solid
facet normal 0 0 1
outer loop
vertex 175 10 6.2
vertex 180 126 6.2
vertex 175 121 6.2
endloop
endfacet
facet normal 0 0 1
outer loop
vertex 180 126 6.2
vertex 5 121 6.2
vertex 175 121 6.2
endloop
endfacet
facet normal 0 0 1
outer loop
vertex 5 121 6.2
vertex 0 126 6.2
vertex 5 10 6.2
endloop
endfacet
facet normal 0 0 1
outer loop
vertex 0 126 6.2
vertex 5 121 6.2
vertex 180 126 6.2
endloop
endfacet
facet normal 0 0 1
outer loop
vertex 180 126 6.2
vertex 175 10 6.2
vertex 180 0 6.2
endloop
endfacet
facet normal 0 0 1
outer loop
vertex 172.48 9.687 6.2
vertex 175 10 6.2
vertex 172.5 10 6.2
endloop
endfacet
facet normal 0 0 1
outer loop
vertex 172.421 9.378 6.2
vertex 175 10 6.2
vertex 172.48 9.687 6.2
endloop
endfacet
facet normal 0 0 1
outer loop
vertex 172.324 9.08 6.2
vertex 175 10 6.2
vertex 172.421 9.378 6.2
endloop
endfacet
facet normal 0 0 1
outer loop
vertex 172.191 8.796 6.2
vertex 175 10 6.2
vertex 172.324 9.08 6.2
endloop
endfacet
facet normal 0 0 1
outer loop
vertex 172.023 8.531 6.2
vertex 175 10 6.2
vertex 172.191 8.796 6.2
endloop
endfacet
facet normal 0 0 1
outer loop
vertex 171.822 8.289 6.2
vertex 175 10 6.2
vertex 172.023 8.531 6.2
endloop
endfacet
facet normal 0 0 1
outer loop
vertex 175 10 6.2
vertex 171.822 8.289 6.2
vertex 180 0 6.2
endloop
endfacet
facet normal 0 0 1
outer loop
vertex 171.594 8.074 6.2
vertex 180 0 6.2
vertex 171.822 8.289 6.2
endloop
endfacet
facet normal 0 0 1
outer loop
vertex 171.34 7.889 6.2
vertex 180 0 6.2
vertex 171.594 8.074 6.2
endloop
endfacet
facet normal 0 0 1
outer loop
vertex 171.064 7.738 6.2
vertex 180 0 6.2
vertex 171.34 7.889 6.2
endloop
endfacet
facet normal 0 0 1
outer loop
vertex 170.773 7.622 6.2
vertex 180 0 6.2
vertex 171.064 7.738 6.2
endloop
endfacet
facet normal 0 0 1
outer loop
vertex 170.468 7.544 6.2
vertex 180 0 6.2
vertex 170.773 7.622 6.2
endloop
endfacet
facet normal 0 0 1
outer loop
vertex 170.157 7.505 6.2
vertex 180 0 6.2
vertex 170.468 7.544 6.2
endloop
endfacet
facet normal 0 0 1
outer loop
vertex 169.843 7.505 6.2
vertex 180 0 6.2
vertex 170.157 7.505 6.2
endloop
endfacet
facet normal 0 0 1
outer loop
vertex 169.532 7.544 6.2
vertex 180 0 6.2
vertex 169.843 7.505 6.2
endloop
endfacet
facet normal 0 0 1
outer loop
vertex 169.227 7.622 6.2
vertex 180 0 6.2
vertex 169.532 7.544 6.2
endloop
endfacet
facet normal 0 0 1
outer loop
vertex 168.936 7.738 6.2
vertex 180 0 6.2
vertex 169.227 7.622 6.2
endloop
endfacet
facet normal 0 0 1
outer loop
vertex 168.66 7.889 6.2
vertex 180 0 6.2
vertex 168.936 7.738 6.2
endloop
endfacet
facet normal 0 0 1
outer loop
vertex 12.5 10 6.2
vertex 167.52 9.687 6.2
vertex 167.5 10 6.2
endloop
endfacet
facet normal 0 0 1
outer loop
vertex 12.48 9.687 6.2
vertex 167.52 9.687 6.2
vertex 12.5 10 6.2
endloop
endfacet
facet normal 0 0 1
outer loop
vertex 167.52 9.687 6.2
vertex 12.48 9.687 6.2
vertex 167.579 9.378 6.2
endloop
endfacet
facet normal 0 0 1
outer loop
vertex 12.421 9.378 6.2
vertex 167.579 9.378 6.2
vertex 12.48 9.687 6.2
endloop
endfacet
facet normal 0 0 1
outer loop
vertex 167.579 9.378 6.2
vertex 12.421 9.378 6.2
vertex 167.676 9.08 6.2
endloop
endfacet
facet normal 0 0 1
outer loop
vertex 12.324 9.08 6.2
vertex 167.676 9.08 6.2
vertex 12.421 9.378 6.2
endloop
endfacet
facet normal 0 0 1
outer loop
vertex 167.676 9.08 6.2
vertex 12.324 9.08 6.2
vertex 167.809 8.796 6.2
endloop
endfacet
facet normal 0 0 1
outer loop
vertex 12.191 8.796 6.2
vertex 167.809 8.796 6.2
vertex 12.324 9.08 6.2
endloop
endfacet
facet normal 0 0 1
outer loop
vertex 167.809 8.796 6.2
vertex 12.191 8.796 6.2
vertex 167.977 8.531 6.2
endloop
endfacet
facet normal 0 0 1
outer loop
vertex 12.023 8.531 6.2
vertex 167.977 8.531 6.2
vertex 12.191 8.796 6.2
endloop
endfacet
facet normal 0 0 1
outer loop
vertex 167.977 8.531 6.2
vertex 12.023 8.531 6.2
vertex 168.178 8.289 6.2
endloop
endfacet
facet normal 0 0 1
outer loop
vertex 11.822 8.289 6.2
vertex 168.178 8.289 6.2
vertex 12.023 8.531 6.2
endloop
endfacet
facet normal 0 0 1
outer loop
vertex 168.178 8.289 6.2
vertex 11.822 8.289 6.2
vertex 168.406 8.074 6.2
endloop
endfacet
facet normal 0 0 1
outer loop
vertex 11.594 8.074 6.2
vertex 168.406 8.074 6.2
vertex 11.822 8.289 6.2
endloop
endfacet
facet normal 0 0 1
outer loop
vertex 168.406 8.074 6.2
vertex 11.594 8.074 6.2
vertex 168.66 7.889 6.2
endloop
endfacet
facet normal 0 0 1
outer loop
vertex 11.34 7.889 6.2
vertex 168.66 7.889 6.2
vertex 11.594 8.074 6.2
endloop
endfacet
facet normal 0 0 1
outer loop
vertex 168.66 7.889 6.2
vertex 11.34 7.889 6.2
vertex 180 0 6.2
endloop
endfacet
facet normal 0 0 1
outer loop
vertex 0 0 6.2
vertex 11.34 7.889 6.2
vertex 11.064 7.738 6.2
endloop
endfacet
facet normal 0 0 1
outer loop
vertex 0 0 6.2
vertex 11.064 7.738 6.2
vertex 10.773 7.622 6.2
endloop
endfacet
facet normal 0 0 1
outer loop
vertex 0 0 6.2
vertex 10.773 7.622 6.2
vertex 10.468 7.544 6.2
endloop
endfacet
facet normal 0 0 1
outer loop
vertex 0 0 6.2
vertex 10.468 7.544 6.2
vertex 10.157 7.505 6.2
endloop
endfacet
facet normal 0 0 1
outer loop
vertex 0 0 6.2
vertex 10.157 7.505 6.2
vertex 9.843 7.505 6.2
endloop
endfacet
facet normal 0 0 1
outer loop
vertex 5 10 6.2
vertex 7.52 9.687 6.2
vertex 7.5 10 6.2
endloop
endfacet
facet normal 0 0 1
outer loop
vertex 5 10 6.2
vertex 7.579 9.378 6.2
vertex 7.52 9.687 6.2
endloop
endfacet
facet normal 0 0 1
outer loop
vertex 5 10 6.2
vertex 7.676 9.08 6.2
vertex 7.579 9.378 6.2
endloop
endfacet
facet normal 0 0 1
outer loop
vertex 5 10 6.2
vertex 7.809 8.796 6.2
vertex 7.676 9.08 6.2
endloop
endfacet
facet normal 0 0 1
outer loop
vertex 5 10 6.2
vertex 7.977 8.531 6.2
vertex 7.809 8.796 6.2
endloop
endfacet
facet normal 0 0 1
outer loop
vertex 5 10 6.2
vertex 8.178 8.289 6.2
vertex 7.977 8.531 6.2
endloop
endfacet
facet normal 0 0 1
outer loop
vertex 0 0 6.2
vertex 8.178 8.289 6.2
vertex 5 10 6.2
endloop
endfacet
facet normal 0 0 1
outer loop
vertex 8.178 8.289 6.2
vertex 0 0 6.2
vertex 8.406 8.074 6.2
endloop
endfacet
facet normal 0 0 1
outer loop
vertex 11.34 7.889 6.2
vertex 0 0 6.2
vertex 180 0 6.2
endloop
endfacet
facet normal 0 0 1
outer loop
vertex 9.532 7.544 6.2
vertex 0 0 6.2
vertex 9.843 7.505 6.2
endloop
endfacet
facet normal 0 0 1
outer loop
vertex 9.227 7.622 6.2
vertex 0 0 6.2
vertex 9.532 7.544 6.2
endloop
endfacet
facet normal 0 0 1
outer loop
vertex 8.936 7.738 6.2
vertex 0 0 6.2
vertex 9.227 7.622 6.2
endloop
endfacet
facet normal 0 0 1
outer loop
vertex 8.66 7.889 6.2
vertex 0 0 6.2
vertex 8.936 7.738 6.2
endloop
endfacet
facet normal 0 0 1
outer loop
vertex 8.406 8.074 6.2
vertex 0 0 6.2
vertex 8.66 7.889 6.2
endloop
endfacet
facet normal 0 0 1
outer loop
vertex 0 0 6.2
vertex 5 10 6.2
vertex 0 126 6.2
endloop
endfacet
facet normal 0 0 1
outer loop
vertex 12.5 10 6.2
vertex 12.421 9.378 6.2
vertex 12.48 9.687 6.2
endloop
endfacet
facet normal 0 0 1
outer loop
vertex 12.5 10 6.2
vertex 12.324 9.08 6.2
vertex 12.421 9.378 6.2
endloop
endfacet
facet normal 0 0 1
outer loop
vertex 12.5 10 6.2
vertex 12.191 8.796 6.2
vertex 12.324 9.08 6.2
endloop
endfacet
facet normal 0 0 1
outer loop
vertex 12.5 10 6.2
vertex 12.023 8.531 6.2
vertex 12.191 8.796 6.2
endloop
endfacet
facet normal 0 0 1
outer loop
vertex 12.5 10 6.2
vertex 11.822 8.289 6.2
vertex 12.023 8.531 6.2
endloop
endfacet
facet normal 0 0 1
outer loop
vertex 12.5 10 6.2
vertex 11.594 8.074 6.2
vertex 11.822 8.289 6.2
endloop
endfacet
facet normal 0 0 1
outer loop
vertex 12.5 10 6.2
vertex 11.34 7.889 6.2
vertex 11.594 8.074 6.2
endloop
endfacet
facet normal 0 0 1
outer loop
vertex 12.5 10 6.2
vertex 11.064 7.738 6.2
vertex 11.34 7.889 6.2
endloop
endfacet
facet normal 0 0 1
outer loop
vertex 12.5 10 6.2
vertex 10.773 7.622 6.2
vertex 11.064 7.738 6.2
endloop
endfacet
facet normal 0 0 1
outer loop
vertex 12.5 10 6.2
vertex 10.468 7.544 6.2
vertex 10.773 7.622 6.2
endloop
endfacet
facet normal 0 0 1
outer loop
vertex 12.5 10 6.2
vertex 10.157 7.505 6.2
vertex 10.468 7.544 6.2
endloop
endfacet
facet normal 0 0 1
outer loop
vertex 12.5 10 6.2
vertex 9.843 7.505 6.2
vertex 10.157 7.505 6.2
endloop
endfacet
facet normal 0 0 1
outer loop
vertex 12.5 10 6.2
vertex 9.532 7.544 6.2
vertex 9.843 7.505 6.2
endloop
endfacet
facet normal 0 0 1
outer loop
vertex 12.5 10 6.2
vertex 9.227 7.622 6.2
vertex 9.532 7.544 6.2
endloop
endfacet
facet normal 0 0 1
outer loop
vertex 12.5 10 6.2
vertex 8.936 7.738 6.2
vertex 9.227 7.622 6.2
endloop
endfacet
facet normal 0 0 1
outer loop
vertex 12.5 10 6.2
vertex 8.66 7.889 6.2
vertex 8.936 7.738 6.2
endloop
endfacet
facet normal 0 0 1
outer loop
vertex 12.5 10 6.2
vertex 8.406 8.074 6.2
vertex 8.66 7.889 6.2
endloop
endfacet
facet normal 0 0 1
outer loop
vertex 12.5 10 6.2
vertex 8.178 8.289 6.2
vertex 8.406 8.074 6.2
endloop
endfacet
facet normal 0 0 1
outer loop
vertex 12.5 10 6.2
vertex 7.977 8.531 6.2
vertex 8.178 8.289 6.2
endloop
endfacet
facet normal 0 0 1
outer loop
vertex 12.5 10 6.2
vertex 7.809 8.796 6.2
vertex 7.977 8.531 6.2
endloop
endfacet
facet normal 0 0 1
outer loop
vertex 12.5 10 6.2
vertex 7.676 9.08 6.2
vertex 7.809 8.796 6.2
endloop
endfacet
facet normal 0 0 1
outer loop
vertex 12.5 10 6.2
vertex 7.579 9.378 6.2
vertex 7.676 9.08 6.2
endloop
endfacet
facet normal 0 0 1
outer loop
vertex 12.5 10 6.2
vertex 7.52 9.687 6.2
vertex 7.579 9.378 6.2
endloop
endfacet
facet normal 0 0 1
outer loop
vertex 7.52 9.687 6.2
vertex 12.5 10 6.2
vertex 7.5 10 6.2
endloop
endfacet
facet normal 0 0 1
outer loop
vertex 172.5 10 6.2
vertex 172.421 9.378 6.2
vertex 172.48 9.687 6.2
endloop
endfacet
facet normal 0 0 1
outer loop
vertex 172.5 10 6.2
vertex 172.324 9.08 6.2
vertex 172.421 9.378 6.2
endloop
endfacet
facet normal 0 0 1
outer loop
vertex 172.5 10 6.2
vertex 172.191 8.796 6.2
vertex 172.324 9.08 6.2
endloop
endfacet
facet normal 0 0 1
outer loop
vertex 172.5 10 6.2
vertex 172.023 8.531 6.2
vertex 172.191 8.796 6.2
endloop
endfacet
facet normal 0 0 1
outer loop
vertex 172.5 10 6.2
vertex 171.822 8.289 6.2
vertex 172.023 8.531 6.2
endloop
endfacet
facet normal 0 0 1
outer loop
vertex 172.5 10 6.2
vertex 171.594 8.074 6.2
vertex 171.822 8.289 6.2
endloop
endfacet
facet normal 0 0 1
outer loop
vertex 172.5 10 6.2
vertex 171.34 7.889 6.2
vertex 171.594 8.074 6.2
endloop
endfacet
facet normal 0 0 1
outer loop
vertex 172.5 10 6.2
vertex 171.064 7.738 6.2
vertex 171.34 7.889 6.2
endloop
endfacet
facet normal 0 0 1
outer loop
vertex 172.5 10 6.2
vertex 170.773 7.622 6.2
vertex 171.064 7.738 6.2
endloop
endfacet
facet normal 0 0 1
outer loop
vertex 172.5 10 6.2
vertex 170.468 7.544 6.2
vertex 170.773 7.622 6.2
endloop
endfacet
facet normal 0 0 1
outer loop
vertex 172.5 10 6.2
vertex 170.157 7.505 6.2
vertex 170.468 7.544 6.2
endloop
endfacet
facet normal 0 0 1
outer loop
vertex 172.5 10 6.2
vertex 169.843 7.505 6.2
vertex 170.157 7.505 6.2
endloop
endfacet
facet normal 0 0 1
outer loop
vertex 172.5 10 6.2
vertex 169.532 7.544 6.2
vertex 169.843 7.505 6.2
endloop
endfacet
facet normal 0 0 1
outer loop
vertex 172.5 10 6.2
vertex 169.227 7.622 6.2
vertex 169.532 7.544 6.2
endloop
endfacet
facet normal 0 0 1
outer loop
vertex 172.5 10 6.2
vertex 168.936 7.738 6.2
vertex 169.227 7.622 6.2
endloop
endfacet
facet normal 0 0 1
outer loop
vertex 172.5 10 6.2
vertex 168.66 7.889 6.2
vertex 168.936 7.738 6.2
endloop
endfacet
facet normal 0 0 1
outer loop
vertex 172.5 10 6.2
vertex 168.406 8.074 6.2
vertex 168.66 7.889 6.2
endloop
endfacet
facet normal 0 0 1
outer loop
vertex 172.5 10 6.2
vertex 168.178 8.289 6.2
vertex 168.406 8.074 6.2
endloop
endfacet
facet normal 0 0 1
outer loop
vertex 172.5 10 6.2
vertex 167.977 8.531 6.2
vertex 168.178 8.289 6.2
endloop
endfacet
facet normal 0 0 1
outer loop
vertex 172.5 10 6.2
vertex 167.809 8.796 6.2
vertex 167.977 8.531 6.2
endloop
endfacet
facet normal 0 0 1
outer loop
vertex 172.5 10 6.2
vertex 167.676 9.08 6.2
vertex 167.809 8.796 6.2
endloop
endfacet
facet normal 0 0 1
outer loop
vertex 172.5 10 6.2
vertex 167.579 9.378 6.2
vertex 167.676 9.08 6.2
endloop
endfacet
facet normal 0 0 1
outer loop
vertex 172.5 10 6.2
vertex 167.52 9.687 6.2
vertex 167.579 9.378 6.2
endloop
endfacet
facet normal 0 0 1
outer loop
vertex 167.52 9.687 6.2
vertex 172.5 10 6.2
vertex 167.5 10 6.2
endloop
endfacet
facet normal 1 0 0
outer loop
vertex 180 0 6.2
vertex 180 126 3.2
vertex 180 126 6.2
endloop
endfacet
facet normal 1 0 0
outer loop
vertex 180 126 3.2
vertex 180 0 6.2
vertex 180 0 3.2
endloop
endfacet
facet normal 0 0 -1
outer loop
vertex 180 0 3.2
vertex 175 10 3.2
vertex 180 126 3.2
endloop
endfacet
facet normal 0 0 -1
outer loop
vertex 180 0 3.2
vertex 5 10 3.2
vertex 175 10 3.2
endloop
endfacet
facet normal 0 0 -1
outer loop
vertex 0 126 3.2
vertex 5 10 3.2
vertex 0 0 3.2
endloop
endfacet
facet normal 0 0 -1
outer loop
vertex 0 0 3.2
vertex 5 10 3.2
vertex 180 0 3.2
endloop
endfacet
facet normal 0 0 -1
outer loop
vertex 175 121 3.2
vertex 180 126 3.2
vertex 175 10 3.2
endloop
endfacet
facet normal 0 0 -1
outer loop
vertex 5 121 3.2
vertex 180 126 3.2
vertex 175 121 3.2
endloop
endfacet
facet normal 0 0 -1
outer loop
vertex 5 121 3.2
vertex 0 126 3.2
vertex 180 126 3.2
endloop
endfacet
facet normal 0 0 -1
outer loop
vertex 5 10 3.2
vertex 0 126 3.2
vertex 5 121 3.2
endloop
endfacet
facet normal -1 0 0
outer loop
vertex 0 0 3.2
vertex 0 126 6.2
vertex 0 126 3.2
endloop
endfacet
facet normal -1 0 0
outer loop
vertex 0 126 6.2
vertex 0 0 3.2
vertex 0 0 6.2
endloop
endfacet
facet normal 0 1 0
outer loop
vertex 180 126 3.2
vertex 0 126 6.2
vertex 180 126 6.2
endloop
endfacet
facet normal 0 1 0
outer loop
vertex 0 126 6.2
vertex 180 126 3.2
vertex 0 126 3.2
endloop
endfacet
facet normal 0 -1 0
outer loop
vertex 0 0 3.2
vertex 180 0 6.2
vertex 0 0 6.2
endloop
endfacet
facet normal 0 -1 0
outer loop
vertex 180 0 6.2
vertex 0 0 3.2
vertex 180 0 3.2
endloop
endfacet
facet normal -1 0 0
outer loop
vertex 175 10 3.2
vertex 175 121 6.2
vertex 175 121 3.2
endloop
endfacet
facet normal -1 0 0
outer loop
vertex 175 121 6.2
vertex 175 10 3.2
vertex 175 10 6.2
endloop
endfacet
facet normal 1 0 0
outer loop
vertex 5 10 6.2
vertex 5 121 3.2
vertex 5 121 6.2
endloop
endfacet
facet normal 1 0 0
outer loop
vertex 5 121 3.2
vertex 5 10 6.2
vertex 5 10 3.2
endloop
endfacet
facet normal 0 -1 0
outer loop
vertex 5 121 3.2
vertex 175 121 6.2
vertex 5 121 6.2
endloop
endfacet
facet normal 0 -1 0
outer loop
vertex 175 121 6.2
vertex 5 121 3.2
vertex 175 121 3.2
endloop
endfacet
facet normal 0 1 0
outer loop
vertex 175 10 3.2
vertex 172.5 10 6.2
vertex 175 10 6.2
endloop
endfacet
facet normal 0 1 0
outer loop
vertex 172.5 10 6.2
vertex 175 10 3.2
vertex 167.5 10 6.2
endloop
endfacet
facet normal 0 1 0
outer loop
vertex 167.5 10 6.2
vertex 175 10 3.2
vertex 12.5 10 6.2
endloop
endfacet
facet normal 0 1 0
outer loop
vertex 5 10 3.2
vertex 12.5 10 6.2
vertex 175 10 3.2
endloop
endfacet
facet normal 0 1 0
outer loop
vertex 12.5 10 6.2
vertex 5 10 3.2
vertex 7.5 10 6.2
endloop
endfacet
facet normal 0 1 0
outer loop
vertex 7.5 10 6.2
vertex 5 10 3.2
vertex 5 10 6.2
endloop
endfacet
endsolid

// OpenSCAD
///////////////////////////////////////////////////////////////////////
//  E-Ink Display Case
//  Parametric Case for 7.3" Waveshare E-Ink & Raspberry Pi Zero W2
//
//  Author: ChatGPT (inspired by snippet provided by @Andy Levesque)
//  License: CC BY-NC
//
//  Description:
//    This OpenSCAD file creates a multi-part enclosure for a 7.3" eInk display
//    (170 mm x 111 mm) plus a Raspberry Pi Zero W2.
//
//    It includes the following pieces (toggled on/off):
//      1) front_frame     (the bezel holding the eInk from the front)
//      2) middle_spacer   (optional spacer ring for additional depth)
//      3) back_shell      (the rear portion that encloses electronics)
//
//  Usage:
//    1) Toggle showFrontFrame, showMiddleSpacer, showBackShell at the end.
//    2) Render or export each part (STL) as needed.
//
//  NOTE: You can adapt or expand it with advanced features (e.g., BOSL2, hex
//        walls, cable cutouts, etc.) to suit your needs.
///////////////////////////////////////////////////////////////////////


// -------------------------------------------------------------------
//                        1) Core Dimensions
// -------------------------------------------------------------------

// 7.3" Waveshare eInk active area ~170 x 111 mm. Adjust to your exact panel.
eInkWidth  = 170;   // mm
eInkHeight = 111;   // mm

// Bezel thickness on each side. By default, 5 mm all around except bottom=10 mm.
bezelTop    = 5;
bezelBottom = 10;
bezelLeft   = 5;
bezelRight  = 5;

// Optional extension beyond each bezel (for cables, stands, or aesthetic).
extendTop    = 0;
extendBottom = 0;
extendLeft   = 0;
extendRight  = 0;

// The front frame’s thickness and the back shell depth.
frameThickness     = 3;    // ring thickness of the front bezel
backShellDepth     = 8;    // interior depth behind the panel
shellWallThickness = 2;    // thickness of the back shell walls

// If you want a separate "middle spacer" to add extra gap:
middleSpacerHeight = 0;    // set > 0 for a 3-part design, else 0

// -------------------------------------------------------------------
//                      2) Mounting / Screws
// -------------------------------------------------------------------

// Screw standoff settings
standoffDiameter       = 4.0;     // outer diameter of standoff
screwHoleDiameter      = 2.5;     // hole diameter for M2.5 (or M3 if bigger)
standoffHeight         = backShellDepth; 
standoffInsetFromEdges = 10;      // offset from edges for each standoff

// The front ring can have countersinks for screw heads:
receptacleDepth   = 2;  // depth of countersink
receptacleDiameter = 5; // diameter for the screw head area

// Number of standoffs along width/height
standoffCountWidth  = 2;  // how many standoffs left-to-right
standoffCountHeight = 2;  // how many standoffs top-to-bottom

// -------------------------------------------------------------------
//                 3) Calculate Overall Dimensions
// -------------------------------------------------------------------

// The overall opening needed for the eInk panel
panelWidth  = eInkWidth;
panelHeight = eInkHeight;

// The front frame’s total X dimension
totalFrameX = panelWidth
             + bezelLeft + bezelRight
             + extendLeft + extendRight;

// The front frame’s total Y dimension
totalFrameY = panelHeight
             + bezelTop + bezelBottom
             + extendTop + extendBottom;

// -------------------------------------------------------------------
//              4) Modules for repeated geometry
// -------------------------------------------------------------------

// Simple rectangular cuboid
module box_3d(sizeXYZ=[10,10,10], center=false) {
    cube(sizeXYZ, center=center);
}

// Standoff with a central screw hole
module standoffWithHole(height, standoffDia, holeDia) {
    difference() {
        cylinder(h = height, r = standoffDia/2, $fn=50);
        translate([0,0,-0.1])  // shift so hole is fully cut
            cylinder(h = height+0.2, r = holeDia/2, $fn=50);
    }
}

// Place multiple standoffs in a grid, inset from edges
module placeStandoffs(standoffHt, standoffDia, holeDia, standoffCntW, standoffCntH) {
    // Range for standoffs: from standoffInsetFromEdges to
    // (totalFrameX - standoffInsetFromEdges)
    spacingW = (totalFrameX - 2*standoffInsetFromEdges);
    spacingH = (totalFrameY - 2*standoffInsetFromEdges);

    // Steps between standoffs
    stepW = (standoffCntW > 1) ? spacingW / (standoffCntW - 1) : 0;
    stepH = (standoffCntH > 1) ? spacingH / (standoffCntH - 1) : 0;
    
    for (ix = [0 : standoffCntW-1]) {
        for (iy = [0 : standoffCntH-1]) {
            xPos = standoffInsetFromEdges + ix * stepW;
            yPos = standoffInsetFromEdges + iy * stepH;
            // Move standoff into place
            translate([xPos, yPos, 0])
                standoffWithHole(standoffHt, standoffDia, holeDia);
        }
    }
}

// A rectangular cutout for the eInk panel region in the front bezel
module eInkCutout() {
    translate([bezelLeft + extendLeft, 
               bezelBottom + extendBottom,
               0])
        cube([panelWidth, panelHeight, 999], center=false);
}

// -------------------------------------------------------------------
//             5) The Front Frame (Top Part)
// -------------------------------------------------------------------
module front_frame() {
    difference() {
        // Outer shape of the front frame
        box_3d(
            sizeXYZ=[totalFrameX, totalFrameY, frameThickness],
            center=false
        );
        
        // Carve out the display opening
        eInkCutout();

        // OPTIONAL: carve out countersinks for screw heads from the top
        translate([0,0,frameThickness])
        for (ix=[0:standoffCountWidth-1]) {
            for (iy=[0:standoffCountHeight-1]) {
                xPos = standoffInsetFromEdges + ix * (
                        (totalFrameX - 2*standoffInsetFromEdges)
                        / max(1,(standoffCountWidth-1))
                    );
                yPos = standoffInsetFromEdges + iy * (
                        (totalFrameY - 2*standoffInsetFromEdges)
                        / max(1,(standoffCountHeight-1))
                    );

                // Cylinder from above
                translate([xPos, yPos, 0]) {
                    cylinder(h = receptacleDepth+0.2, r = receptacleDiameter/2, $fn=50);
                }
            }
        }
    }
}

// -------------------------------------------------------------------
//             6) The Middle Spacer (Optional)
// -------------------------------------------------------------------
module middle_spacer() {
    if(middleSpacerHeight > 0) {
        difference() {
            // Outer block
            box_3d(
                sizeXYZ=[totalFrameX, totalFrameY, middleSpacerHeight],
                center=false
            );
            // The same eInkCutout so it's hollow in the center
            eInkCutout();
        }
    }
}

// -------------------------------------------------------------------
//             7) The Back Shell (Bottom Part)
// -------------------------------------------------------------------
module back_shell() {
    // The back shell is totalFrameX x totalFrameY in XY,
    // with (shellWallThickness + backShellDepth) in Z.
    // Inside is hollow for the Pi, etc.

    union() {
        // Outer perimeter + floor
        difference() {
            // Full block
            box_3d(
                sizeXYZ=[totalFrameX, totalFrameY, (backShellDepth + shellWallThickness)],
                center=false
            );
            // Hollow out inside
            translate([shellWallThickness, shellWallThickness, shellWallThickness])
                box_3d(
                    sizeXYZ=[
                        totalFrameX - 2*shellWallThickness,
                        totalFrameY - 2*shellWallThickness,
                        backShellDepth
                    ],
                    center=false
                );
        }

        // Add standoffs inside on the floor
        translate([0,0,0]) {
            placeStandoffs(standoffHeight, standoffDiameter, screwHoleDiameter, 
                           standoffCountWidth, standoffCountHeight);
        }
    }
}

// -------------------------------------------------------------------
//                 8) Toggles & Final Assembly
// -------------------------------------------------------------------

// Toggles: set these to true/false to enable or disable each part
showFrontFrame    = true;
showMiddleSpacer  = false;
showBackShell     = false;

// A small gap so parts don't overlap visually if all are shown at once
assemblyGap = 0.2;

// We'll stack them along Z, in the order: front frame -> middle -> back
zPos = 0;

if (showFrontFrame) {
    translate([0,0,zPos]) front_frame();
    zPos = zPos + frameThickness + assemblyGap;
}

if (showMiddleSpacer && middleSpacerHeight > 0) {
    translate([0,0,zPos]) middle_spacer();
    zPos = zPos + middleSpacerHeight + assemblyGap;
}

if (showBackShell) {
    translate([0,0,zPos]) back_shell();
    // We don't necessarily need to add anything to zPos if it's the last piece
}
